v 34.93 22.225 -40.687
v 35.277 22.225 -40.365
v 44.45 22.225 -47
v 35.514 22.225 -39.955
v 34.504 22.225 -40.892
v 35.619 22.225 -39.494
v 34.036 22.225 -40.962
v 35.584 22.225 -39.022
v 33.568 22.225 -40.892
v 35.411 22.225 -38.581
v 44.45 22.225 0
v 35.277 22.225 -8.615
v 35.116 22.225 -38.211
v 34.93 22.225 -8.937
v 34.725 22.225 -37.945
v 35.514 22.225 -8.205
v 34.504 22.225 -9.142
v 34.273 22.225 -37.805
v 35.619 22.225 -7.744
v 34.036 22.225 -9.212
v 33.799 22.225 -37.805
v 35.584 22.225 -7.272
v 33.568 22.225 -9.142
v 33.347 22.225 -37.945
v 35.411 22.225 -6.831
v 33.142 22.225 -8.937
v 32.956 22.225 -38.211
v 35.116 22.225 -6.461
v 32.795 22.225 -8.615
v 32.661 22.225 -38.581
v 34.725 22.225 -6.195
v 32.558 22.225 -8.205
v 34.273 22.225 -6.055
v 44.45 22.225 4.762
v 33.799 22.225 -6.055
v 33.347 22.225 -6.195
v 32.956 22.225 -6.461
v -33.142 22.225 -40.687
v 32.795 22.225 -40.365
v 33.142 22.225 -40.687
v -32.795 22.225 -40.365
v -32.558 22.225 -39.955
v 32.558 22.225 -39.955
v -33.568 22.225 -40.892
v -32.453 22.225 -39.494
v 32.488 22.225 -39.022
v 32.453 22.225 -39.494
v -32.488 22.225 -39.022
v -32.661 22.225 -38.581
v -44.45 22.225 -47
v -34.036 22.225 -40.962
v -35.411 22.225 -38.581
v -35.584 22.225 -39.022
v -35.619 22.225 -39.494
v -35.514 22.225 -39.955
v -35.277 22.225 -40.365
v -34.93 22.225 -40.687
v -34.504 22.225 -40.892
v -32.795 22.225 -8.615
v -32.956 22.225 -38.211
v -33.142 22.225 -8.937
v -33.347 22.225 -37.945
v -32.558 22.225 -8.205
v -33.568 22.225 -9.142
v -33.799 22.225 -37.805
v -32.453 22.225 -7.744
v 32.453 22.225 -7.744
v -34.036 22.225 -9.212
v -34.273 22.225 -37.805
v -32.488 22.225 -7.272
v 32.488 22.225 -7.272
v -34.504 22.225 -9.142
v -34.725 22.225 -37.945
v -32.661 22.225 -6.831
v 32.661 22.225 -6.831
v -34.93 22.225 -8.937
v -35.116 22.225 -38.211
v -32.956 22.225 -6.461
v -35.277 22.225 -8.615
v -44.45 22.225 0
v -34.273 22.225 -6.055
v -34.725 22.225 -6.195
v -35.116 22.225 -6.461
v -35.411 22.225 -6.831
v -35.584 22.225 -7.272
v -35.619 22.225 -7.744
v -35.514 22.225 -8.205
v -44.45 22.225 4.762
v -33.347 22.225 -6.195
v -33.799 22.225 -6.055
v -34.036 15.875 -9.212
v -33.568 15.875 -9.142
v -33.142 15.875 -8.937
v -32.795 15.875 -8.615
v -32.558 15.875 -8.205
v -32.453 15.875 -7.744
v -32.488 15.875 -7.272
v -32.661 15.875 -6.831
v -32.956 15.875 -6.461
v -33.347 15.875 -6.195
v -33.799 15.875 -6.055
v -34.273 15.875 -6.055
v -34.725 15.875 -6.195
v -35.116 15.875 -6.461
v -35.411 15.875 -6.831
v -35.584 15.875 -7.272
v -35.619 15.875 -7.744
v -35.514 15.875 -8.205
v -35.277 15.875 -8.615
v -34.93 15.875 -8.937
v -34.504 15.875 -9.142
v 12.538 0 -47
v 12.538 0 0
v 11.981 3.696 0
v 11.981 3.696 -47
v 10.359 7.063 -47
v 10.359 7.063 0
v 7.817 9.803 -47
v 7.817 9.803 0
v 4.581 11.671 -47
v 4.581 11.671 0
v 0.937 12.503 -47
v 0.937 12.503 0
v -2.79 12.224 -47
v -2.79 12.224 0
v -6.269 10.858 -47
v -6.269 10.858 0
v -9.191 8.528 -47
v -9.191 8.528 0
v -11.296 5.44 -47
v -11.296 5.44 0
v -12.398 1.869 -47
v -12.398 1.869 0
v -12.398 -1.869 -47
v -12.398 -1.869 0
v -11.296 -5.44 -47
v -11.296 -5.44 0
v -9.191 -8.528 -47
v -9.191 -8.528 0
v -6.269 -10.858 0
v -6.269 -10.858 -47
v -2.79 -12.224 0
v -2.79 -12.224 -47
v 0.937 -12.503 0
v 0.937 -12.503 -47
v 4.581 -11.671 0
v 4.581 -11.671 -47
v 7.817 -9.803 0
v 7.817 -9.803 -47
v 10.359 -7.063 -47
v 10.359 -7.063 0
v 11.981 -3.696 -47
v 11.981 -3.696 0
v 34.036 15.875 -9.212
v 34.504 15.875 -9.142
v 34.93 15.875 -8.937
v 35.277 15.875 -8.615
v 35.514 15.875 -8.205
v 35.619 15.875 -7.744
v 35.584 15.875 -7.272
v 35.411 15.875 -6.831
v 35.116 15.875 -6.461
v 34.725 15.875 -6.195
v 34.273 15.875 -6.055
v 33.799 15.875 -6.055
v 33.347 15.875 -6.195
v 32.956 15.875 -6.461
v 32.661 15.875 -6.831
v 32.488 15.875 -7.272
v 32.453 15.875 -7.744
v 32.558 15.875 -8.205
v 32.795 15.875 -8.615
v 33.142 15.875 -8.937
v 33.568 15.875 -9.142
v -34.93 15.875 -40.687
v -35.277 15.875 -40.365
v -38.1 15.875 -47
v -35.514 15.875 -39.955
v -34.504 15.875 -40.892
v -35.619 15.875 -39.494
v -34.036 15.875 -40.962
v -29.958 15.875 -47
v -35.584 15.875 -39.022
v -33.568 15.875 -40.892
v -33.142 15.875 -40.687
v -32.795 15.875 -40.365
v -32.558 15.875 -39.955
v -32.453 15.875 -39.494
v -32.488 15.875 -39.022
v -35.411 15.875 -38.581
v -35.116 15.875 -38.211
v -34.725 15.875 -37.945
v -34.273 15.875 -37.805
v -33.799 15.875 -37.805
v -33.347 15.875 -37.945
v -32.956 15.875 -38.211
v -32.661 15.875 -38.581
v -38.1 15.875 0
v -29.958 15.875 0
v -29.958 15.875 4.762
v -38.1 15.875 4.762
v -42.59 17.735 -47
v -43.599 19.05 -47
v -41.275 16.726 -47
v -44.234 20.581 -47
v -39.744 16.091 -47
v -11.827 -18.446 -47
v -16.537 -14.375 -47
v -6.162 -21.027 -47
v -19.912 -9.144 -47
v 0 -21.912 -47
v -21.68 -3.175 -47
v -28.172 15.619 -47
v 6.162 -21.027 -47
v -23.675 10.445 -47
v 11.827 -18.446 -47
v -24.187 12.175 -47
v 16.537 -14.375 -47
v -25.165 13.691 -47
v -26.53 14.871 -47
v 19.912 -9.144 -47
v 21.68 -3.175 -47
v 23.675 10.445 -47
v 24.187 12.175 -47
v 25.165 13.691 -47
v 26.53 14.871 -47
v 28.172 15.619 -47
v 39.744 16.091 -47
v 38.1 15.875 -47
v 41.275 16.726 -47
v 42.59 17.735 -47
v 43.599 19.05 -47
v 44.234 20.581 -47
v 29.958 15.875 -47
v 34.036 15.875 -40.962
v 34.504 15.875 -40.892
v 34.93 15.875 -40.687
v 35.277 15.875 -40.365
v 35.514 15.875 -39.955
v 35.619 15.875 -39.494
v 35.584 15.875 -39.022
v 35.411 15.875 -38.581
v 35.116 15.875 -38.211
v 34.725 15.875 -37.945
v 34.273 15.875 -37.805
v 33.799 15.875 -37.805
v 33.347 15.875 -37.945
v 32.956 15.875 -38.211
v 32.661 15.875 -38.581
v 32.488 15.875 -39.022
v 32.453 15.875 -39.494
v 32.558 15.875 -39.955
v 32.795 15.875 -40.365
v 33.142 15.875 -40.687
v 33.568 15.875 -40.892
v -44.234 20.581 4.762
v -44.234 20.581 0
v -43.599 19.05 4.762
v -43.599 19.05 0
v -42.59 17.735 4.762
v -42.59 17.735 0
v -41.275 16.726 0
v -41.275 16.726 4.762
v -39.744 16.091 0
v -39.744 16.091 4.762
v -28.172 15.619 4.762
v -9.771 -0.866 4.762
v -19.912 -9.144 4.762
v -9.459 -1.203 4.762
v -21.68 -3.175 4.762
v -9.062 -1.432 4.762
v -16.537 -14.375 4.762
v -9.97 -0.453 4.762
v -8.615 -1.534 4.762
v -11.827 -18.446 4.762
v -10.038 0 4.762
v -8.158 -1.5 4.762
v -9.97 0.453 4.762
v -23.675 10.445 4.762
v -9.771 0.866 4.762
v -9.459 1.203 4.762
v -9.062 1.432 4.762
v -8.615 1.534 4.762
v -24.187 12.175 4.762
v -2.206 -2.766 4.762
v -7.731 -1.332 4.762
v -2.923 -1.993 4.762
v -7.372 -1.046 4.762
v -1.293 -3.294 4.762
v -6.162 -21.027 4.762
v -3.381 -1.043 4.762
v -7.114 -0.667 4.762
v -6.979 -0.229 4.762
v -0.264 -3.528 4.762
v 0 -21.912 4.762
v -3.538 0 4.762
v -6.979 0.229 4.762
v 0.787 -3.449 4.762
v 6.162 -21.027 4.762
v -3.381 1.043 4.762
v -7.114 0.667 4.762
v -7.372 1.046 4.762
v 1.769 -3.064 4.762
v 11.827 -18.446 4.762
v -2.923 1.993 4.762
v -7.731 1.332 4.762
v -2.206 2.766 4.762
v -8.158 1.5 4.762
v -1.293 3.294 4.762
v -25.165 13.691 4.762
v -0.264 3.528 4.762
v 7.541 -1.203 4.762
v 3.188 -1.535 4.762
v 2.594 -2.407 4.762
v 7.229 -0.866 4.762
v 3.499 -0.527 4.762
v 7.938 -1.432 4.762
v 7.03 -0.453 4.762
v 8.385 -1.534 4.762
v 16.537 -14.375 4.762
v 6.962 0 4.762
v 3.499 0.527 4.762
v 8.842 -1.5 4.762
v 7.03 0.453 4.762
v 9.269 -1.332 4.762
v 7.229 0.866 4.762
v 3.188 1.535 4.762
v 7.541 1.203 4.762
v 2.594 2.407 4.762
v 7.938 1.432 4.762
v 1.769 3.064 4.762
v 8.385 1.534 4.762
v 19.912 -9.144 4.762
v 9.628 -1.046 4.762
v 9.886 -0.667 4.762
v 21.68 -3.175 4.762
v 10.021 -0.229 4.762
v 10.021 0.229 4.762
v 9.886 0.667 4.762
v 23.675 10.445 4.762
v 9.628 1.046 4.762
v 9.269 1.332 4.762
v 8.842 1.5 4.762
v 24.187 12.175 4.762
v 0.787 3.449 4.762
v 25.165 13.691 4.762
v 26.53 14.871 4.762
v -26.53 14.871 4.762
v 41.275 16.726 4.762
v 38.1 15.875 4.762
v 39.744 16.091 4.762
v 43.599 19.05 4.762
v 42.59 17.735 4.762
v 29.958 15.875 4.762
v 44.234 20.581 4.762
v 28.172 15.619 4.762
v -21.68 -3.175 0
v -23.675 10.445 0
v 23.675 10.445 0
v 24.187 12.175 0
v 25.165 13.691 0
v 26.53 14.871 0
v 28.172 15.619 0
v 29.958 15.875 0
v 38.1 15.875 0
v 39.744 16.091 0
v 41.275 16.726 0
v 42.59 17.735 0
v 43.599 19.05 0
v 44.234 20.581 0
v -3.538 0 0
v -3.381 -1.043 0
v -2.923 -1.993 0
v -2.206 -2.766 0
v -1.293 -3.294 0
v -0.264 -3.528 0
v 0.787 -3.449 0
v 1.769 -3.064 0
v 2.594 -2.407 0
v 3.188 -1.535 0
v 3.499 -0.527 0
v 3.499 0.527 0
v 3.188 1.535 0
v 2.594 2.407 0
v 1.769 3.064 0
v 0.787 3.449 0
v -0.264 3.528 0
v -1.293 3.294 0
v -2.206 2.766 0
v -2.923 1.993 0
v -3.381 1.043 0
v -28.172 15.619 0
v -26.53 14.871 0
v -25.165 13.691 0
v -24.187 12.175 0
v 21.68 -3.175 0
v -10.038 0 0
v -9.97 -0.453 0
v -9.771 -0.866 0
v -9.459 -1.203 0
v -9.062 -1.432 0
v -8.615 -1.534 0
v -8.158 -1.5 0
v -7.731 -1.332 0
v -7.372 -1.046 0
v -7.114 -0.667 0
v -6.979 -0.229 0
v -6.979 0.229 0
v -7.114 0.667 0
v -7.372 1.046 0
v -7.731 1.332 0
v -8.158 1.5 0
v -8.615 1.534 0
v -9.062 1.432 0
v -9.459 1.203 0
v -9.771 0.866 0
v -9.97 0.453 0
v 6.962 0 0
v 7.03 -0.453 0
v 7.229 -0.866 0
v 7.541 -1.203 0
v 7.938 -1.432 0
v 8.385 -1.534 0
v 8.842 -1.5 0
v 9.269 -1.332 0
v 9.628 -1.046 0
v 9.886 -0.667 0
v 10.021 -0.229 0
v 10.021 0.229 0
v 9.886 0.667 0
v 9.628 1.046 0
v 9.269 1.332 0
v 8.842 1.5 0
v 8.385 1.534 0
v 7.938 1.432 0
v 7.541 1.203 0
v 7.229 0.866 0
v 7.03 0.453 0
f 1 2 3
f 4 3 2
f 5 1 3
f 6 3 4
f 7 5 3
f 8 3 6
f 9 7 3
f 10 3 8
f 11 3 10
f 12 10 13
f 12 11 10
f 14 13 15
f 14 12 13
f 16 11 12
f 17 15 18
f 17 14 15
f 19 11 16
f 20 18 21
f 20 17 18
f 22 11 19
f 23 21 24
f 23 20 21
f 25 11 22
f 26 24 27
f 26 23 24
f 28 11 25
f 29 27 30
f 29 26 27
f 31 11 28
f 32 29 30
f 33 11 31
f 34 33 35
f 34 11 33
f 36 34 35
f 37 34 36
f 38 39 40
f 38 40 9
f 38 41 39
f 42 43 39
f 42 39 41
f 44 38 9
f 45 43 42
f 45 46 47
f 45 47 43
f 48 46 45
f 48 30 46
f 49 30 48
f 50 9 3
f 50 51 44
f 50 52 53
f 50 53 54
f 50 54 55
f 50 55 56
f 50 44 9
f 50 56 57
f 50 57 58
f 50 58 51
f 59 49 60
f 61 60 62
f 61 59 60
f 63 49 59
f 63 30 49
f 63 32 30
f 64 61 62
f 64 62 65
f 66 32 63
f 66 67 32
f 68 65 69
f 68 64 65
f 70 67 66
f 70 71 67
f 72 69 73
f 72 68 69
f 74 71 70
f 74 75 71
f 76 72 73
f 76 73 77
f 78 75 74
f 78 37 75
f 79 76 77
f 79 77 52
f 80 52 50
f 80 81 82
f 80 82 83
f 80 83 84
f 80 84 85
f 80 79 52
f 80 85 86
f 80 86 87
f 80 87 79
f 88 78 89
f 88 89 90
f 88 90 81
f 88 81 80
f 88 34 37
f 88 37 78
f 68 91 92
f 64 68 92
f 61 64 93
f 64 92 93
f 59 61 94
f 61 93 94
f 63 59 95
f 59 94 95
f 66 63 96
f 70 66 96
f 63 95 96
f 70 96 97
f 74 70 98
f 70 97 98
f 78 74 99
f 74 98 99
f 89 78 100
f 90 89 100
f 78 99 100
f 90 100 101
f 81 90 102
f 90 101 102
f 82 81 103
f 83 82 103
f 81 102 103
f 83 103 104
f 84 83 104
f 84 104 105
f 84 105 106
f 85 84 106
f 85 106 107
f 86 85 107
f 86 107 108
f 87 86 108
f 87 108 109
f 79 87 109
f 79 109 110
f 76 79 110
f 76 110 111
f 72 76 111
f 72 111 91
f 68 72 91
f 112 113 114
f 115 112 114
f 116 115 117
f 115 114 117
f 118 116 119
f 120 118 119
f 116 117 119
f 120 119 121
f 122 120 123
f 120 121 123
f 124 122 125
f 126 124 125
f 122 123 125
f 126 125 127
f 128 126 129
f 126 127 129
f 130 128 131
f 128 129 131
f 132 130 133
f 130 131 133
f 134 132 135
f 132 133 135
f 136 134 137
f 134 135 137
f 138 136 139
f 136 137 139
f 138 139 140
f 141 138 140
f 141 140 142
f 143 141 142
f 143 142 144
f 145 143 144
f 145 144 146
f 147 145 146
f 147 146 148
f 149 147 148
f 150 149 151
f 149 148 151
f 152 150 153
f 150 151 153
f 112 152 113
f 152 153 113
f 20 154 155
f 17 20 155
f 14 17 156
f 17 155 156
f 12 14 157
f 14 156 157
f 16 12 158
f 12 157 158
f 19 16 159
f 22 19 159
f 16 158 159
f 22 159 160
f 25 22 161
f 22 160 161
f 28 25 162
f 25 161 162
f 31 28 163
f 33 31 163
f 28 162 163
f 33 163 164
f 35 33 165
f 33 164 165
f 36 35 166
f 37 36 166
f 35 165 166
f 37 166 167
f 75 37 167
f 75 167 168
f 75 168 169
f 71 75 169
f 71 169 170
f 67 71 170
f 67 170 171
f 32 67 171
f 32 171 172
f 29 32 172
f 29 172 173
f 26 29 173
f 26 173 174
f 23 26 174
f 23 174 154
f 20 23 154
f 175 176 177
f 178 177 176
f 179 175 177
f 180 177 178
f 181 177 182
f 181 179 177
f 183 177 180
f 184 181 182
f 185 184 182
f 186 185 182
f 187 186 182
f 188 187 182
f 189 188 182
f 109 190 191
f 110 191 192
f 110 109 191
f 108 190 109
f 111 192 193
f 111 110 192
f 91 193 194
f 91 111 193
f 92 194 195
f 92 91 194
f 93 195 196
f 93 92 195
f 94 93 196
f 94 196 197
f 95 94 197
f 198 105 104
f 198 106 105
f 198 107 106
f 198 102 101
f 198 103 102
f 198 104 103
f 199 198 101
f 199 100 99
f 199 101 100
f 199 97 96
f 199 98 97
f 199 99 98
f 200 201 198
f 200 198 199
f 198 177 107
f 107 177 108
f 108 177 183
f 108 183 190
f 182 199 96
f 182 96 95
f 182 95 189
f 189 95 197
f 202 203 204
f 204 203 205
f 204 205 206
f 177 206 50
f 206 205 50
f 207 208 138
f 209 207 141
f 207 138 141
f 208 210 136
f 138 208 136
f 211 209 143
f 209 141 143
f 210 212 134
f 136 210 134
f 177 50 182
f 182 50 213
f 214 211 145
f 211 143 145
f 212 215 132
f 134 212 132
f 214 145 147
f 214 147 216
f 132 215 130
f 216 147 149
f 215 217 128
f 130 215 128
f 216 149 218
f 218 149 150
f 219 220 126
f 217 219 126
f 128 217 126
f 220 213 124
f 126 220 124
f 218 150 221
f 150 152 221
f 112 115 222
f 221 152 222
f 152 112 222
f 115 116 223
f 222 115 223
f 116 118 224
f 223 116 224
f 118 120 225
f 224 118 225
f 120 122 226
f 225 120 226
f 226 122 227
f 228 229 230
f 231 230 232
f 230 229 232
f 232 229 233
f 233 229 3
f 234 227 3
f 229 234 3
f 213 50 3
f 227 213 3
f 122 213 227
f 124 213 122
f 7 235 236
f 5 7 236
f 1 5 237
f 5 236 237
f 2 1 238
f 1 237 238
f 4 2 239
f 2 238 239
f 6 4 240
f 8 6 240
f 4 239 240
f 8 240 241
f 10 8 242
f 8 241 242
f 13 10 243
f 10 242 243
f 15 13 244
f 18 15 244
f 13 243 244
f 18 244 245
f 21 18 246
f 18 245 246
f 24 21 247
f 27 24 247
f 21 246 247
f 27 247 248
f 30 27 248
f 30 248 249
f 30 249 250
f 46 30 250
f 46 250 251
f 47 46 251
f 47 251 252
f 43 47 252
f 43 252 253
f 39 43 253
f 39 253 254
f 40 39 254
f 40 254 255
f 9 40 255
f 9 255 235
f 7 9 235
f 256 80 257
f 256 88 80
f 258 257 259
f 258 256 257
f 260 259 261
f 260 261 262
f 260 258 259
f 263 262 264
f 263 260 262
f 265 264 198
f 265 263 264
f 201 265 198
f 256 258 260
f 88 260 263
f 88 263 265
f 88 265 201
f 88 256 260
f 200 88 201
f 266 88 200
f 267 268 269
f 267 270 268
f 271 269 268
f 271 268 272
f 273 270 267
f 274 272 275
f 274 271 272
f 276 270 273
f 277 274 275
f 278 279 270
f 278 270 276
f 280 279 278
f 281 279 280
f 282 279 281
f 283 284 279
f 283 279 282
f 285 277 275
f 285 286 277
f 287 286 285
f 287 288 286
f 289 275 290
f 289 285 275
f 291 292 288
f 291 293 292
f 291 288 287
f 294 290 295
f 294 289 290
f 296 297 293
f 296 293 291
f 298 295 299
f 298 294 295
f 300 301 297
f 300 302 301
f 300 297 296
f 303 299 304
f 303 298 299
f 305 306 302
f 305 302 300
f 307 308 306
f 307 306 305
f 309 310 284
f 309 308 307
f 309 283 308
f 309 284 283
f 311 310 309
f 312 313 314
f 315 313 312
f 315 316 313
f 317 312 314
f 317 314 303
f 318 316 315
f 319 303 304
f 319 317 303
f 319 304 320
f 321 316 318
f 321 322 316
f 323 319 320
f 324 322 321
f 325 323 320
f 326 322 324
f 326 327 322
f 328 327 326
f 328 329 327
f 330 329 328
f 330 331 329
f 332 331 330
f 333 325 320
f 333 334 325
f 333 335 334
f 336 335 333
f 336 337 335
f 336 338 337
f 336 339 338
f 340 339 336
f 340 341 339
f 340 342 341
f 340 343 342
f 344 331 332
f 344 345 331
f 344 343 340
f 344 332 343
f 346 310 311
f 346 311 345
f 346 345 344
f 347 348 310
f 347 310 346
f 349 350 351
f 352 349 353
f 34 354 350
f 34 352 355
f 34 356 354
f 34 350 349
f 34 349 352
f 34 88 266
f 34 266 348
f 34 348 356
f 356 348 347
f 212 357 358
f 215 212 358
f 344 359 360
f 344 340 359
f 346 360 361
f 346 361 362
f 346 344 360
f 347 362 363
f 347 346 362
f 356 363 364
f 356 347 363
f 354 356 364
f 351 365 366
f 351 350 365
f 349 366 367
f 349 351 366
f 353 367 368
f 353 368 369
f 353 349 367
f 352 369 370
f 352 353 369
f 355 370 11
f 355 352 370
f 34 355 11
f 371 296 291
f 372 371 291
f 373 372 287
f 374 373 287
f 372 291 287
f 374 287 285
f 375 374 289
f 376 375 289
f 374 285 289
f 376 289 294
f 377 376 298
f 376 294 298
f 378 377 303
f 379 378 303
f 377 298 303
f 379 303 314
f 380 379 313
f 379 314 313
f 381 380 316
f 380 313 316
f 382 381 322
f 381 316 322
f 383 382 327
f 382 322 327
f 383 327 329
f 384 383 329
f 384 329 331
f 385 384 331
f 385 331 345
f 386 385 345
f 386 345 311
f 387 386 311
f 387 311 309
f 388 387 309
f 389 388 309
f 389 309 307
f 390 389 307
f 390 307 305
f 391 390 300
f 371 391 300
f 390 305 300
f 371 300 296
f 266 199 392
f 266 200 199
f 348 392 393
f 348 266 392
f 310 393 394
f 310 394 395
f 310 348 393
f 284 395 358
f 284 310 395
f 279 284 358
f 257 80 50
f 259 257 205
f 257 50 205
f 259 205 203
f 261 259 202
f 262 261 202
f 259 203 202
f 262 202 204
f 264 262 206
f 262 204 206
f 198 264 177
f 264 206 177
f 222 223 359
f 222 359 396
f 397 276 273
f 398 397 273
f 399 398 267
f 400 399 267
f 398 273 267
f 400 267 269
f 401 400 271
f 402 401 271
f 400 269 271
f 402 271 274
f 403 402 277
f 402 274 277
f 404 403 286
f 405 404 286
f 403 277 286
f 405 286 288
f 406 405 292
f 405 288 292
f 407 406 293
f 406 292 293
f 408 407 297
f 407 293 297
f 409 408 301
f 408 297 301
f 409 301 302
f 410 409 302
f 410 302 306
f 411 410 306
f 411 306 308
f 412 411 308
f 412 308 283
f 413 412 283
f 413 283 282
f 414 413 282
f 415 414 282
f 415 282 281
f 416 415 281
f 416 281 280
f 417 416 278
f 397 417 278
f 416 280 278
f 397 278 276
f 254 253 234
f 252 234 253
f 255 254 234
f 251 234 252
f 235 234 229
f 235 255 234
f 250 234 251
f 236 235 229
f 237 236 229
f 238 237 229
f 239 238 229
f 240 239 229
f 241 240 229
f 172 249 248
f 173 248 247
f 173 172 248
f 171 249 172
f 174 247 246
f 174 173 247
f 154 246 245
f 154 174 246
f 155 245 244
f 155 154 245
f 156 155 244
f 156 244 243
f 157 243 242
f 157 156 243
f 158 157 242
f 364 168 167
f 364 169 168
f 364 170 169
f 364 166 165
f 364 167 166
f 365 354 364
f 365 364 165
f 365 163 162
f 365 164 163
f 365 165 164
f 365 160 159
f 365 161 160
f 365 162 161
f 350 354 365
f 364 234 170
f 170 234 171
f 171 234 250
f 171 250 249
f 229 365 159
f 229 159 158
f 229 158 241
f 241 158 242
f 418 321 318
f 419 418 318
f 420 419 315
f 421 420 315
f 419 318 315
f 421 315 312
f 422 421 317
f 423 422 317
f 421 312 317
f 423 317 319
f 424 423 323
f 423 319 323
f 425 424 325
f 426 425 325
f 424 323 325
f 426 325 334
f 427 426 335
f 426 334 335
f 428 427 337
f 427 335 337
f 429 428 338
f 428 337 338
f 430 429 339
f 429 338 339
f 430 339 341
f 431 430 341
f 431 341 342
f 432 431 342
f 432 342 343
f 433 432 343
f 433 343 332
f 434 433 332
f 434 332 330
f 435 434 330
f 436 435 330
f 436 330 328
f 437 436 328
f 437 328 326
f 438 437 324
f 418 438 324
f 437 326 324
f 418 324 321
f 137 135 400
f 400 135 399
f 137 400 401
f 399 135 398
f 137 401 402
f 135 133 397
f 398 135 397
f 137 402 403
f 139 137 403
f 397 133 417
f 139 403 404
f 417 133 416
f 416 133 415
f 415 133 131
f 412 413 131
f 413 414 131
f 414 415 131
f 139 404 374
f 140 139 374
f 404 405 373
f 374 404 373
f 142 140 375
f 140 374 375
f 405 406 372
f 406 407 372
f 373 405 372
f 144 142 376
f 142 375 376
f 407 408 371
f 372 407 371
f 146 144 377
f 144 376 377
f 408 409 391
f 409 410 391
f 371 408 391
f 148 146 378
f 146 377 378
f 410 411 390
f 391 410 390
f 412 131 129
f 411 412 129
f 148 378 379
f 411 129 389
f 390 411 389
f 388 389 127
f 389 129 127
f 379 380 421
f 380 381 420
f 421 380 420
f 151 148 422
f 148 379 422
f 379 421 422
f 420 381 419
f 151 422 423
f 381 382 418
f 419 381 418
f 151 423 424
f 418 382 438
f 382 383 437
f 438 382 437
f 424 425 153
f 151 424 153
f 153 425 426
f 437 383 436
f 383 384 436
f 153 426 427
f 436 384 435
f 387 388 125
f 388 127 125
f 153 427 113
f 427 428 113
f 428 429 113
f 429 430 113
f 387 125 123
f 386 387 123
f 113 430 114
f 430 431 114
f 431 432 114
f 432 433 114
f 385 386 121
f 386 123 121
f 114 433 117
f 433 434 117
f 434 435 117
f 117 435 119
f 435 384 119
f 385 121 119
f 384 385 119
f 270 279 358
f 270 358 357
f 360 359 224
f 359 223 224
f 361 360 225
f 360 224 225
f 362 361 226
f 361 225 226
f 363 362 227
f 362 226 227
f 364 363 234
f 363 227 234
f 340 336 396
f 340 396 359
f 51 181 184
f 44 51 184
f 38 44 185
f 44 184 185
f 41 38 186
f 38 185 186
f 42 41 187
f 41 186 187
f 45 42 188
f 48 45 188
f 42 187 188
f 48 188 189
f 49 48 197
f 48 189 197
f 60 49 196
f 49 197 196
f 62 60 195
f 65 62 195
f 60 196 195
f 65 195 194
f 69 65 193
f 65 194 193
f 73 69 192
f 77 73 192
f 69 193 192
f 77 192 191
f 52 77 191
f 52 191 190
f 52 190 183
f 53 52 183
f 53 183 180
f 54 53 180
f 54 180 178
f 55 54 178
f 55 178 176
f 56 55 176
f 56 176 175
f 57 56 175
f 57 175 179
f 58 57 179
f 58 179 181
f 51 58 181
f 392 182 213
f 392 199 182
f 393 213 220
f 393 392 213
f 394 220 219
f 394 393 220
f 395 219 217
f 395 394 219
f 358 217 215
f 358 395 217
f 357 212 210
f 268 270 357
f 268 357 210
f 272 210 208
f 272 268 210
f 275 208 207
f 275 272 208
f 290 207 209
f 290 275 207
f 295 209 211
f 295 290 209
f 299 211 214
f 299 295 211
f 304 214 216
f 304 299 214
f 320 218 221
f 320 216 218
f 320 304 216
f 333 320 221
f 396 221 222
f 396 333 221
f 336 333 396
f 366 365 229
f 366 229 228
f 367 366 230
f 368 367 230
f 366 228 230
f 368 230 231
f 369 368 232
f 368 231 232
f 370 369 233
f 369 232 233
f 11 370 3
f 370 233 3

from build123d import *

# Parameters (mm, degrees)
SKETCH1_R           = 12.5381004
BOSS_EXTRUDE1_DEPTH = 47
SKETCH2_W           = 88.9
SKETCH2_H           = 47
BOSS_EXTRUDE2_DEPTH = 6.35
FILLET1_R           = 6.35
SKETCH3_R           = 1.5875
CUT_EXTRUDE1_DEPTH  = 9.525
BOSS_EXTRUDE3_START = 4.7625
SKETCH5_R           = 3.5381057
SKETCH5_R_2         = 1.538097
BOSS_EXTRUDE3_DEPTH = 4.7625


with BuildPart() as part:
    # Sketch1 → Boss-Extrude1 (new body)
    with BuildSketch(Plane.XY):
        with BuildLine():
            Line((-25.4, 22.225), (25.4, 22.225))
            Line((25.4, 22.225), (21.680256121, -3.175))
            ThreePointArc((21.680256121, -3.175), (0, -21.911506805), (-21.680256121, -3.175))
            Line((-21.680256121, -3.175), (-25.4, 22.225))
        make_face()
        Circle(SKETCH1_R, mode=Mode.SUBTRACT)
    extrude(amount=-BOSS_EXTRUDE1_DEPTH)

    # Sketch2 → Boss-Extrude2 (add)
    with BuildSketch(Plane(origin=(0, 22.225, 0), x_dir=(1, 0, 0), z_dir=(0, 1, 0))):
        with Locations((0, 23.5)):
            Rectangle(SKETCH2_W, SKETCH2_H)
    extrude(amount=-BOSS_EXTRUDE2_DEPTH)

    # Fillet1
    fillet1_edges = [part.edges().sort_by_distance(p)[0] for p in [
        (44.45, 15.875, -23.5),
        (-44.45, 15.875, -23.5),
        (24.47006403, 15.875, -23.5),
        (-24.47006403, 15.875, -23.5),
    ]]
    fillet(fillet1_edges, radius=FILLET1_R - 0.0001)  # a hair under: the kernel refuses the full size

    # Sketch3 → Cut-Extrude1 (cut)
    with BuildSketch(Plane.XZ.offset(-15.875)):
        with Locations(Location((-34.036, -7.625, 0), (0, 0, 270))):
            Circle(SKETCH3_R)
        with Locations(Location((-34.036, -39.375, 0), (0, 0, 270))):
            Circle(SKETCH3_R)
        with Locations(Location((34.036, -39.375, 0), (0, 0, 270))):
            Circle(SKETCH3_R)
        with Locations(Location((34.036, -7.625, 0), (0, 0, 270))):
            Circle(SKETCH3_R)
    extrude(amount=-CUT_EXTRUDE1_DEPTH, mode=Mode.SUBTRACT)

    # Sketch5 → Boss-Extrude3 (add)
    with BuildSketch(Plane.XY.offset(BOSS_EXTRUDE3_START)):
        with BuildLine():
            Line((29.957859818, 15.875), (38.1, 15.875))
            ThreePointArc((38.1, 15.875), (42.590128061, 17.734871939), (44.45, 22.225))
            Line((44.45, 22.225), (-44.45, 22.225))
            ThreePointArc((-44.45, 22.225), (-42.590128061, 17.734871939), (-38.1, 15.875))
            Line((-38.1, 15.875), (-29.957859818, 15.875))
            ThreePointArc((-29.957859818, 15.875), (-25.805768294, 14.329439195), (-23.674876744, 10.445121568))
            Line((-23.674876744, 10.445121568), (-21.680256121, -3.175))
            ThreePointArc((-21.680256121, -3.175), (0, -21.911506805), (21.680256121, -3.175))
            Line((21.680256121, -3.175), (23.674876744, 10.445121568))
            ThreePointArc((23.674876744, 10.445121568), (25.805768294, 14.329439195), (29.957859818, 15.875))
        make_face()
        with Locations(Location((0, 0, 0), (0, 0, 180))):
            Circle(SKETCH5_R, mode=Mode.SUBTRACT)
        with Locations(Location((-8.5, 0, 0), (0, 0, 180))):
            Circle(SKETCH5_R_2, mode=Mode.SUBTRACT)
        with Locations(Location((8.5, 0, 0), (0, 0, 180))):
            Circle(SKETCH5_R_2, mode=Mode.SUBTRACT)
    extrude(amount=-BOSS_EXTRUDE3_DEPTH)


solid = part.part
